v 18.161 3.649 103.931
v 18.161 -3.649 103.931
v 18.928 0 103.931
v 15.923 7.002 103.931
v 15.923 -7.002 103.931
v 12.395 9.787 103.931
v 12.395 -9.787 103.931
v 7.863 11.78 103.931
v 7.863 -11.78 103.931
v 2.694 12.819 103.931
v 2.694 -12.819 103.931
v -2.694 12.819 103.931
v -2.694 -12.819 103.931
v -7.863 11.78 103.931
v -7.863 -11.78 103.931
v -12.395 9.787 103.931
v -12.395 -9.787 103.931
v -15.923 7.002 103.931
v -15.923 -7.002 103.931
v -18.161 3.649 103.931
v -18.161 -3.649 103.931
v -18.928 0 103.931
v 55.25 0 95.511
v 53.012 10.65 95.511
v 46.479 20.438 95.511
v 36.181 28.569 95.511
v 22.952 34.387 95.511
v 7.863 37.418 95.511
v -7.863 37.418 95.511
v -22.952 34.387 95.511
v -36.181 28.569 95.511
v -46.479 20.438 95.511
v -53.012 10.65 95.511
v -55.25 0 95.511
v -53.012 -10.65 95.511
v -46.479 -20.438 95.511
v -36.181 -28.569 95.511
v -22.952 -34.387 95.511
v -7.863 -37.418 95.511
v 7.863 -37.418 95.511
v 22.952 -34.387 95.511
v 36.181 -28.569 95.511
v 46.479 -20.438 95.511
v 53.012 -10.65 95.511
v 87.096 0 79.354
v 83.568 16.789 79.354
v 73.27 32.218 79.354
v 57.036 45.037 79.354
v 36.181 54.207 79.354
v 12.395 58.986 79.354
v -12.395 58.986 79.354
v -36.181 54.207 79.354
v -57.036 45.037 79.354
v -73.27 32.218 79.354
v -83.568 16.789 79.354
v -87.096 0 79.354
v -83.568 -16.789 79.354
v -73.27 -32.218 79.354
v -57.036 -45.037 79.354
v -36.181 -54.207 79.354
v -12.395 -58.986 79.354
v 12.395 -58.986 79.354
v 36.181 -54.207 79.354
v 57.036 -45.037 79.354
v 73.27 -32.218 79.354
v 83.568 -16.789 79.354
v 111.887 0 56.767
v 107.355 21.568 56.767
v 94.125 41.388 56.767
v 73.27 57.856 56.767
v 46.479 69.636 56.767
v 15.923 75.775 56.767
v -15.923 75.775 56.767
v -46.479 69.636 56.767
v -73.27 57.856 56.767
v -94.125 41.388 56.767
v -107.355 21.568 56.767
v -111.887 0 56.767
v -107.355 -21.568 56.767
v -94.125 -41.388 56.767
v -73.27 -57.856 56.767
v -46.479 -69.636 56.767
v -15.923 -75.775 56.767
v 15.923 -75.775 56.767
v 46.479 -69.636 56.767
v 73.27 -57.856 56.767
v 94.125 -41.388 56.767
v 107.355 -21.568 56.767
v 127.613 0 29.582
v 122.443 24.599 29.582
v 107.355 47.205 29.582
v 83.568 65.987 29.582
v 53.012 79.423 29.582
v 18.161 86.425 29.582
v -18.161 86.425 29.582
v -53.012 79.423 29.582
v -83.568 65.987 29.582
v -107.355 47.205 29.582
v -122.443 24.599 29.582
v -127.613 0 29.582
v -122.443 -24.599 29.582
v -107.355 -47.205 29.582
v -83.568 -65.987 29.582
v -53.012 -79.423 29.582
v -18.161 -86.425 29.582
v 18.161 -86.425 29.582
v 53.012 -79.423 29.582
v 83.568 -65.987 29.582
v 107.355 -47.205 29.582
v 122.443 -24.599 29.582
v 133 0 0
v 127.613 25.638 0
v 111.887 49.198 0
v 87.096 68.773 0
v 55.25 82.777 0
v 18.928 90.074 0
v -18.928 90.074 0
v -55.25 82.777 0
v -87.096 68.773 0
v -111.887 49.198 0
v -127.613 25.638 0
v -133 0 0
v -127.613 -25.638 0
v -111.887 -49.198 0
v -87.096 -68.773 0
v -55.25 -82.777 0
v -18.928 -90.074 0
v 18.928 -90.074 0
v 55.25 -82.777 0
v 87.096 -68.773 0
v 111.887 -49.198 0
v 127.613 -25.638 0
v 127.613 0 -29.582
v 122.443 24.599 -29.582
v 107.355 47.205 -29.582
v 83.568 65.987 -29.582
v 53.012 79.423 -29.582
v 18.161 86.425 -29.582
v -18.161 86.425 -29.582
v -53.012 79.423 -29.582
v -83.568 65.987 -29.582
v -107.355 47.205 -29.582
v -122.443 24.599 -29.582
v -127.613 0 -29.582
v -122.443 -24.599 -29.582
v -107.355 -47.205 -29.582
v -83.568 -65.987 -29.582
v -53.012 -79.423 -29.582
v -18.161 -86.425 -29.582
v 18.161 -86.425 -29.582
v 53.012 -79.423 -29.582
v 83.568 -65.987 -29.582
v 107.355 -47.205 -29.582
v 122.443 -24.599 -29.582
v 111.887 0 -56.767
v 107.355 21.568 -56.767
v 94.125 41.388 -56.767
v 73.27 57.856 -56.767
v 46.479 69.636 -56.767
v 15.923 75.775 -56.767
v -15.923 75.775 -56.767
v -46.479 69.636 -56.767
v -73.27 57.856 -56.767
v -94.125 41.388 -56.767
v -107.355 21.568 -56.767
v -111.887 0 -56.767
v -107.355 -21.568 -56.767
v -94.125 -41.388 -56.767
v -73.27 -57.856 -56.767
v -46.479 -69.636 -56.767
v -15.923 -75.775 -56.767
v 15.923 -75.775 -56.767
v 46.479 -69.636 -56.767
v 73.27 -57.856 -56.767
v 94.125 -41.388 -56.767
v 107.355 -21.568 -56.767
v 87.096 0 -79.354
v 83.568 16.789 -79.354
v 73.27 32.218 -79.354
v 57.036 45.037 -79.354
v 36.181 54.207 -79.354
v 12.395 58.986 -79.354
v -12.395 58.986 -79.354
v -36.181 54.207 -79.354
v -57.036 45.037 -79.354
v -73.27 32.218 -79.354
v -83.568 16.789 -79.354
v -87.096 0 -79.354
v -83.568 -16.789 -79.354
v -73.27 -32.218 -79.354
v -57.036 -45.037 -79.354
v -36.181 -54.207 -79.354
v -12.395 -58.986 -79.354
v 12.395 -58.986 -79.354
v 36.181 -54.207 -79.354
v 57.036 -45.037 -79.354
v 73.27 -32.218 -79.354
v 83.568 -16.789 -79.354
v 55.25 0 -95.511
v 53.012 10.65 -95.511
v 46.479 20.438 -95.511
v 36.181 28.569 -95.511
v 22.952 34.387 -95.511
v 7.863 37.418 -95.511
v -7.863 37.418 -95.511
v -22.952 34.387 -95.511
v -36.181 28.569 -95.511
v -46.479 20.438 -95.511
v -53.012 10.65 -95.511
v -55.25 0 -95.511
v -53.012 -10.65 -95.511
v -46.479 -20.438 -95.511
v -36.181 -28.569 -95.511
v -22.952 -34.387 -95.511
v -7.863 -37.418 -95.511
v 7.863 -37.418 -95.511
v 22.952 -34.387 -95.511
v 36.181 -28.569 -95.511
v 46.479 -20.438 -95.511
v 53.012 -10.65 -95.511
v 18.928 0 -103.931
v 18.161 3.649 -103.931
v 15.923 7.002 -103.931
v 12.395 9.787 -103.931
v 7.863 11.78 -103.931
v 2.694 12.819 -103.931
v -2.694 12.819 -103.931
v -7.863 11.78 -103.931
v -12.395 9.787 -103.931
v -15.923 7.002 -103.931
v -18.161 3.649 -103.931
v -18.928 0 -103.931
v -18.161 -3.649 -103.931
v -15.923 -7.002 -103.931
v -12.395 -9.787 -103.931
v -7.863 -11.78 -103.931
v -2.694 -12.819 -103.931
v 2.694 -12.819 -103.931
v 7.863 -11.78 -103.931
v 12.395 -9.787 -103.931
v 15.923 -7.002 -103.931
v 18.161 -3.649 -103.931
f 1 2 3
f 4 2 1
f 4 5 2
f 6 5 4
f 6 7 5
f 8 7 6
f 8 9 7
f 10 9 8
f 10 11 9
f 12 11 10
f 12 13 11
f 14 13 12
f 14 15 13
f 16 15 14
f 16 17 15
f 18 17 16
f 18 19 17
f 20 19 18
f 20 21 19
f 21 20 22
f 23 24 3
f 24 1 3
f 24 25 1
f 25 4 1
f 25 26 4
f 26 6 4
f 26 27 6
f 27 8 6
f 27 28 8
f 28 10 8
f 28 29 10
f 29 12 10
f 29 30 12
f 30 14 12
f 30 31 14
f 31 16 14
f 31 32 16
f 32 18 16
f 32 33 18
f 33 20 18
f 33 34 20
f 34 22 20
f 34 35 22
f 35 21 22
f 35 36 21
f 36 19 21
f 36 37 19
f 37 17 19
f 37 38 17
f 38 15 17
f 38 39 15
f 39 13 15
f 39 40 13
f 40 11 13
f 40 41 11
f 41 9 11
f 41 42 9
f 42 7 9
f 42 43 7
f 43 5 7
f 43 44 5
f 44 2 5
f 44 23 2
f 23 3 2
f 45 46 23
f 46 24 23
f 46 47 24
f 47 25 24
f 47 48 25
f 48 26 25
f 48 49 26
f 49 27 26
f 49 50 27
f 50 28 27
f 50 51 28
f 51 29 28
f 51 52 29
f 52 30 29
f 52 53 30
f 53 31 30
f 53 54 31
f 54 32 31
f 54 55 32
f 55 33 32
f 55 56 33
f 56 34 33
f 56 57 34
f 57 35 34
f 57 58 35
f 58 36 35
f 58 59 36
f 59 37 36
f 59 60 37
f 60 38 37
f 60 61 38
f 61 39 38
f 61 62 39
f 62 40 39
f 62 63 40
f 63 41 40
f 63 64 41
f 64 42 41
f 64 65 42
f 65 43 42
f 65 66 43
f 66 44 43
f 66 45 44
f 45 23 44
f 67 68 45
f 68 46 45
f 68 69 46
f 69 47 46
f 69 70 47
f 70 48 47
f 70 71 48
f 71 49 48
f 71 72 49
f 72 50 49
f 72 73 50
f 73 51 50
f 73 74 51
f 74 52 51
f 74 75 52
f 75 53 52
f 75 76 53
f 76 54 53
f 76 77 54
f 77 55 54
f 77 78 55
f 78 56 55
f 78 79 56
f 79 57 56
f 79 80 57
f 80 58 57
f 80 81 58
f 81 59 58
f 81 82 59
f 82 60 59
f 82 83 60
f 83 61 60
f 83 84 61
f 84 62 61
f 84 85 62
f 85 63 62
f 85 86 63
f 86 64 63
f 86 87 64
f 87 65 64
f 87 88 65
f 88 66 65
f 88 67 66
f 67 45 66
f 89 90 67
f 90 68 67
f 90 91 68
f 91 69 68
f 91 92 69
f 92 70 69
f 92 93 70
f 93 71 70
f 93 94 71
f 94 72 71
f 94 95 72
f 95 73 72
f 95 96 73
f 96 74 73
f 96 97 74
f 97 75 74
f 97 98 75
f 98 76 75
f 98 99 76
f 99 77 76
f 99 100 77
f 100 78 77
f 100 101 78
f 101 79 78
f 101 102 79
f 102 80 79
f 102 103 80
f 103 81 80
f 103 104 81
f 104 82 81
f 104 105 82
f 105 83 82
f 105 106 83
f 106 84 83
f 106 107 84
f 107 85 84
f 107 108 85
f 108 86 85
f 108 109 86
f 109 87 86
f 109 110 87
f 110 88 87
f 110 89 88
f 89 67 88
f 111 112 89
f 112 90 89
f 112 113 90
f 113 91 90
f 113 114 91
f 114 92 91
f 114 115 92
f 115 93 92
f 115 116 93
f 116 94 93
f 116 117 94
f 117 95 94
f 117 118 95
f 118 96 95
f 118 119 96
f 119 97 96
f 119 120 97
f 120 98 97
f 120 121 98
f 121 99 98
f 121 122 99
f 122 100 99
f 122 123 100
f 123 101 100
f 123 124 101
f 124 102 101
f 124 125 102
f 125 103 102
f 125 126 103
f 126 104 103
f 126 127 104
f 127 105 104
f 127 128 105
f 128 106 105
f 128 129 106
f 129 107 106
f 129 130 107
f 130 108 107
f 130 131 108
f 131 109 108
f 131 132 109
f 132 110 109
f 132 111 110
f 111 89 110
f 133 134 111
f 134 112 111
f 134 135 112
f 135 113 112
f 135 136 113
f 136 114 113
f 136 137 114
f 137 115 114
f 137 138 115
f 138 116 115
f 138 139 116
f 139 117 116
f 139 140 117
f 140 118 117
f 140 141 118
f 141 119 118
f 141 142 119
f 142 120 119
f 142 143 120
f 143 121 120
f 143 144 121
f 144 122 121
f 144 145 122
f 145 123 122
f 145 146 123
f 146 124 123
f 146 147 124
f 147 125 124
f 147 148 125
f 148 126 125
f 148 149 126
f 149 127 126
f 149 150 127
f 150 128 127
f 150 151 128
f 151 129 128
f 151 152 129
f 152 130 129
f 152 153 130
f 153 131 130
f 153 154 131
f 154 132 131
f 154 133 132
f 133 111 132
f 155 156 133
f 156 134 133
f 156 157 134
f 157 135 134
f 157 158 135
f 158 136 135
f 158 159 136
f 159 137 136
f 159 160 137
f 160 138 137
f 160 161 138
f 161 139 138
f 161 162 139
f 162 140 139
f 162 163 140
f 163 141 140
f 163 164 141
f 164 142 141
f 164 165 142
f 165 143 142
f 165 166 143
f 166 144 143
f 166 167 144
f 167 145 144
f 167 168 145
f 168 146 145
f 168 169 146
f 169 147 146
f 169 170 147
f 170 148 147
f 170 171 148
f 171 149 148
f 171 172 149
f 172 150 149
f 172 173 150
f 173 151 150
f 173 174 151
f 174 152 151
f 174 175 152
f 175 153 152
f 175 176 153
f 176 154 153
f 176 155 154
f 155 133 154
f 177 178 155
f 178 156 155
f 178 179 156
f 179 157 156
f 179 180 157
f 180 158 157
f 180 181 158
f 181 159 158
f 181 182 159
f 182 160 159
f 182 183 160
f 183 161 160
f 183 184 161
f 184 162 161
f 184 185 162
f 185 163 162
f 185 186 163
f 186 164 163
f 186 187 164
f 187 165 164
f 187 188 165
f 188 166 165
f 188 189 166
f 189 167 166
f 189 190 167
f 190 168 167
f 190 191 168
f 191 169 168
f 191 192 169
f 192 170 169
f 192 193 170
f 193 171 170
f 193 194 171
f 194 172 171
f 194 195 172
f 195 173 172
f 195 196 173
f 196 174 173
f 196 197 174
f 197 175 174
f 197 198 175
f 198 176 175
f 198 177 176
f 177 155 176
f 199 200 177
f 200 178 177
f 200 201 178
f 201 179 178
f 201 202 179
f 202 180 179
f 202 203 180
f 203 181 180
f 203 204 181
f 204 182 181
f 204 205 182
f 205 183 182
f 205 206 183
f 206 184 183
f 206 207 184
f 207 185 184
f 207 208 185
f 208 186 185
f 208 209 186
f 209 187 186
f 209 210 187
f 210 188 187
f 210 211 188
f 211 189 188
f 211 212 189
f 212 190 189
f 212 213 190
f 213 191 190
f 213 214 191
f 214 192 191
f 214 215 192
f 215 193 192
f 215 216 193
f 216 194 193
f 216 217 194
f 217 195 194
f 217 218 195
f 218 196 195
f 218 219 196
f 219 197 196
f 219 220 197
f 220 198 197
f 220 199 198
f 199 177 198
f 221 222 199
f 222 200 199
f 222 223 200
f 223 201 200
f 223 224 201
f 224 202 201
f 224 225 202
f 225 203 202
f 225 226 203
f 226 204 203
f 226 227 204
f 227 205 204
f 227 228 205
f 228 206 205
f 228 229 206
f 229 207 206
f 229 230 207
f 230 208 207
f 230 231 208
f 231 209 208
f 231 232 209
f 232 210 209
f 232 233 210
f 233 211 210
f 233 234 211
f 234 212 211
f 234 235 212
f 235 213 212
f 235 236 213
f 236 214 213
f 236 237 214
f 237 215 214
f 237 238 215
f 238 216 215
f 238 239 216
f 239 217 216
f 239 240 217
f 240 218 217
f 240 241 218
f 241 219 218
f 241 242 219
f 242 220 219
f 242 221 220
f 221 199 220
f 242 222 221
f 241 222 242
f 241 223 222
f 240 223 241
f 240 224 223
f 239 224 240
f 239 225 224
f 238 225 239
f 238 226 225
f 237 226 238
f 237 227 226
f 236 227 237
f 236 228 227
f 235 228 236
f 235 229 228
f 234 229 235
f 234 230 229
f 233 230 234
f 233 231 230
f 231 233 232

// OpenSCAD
// Generated by SolidPython 1.0.1 on 2020-07-29 00:46:54


scale(v = [19, 13, 15]) {
	sphere(r = 7);
}
/***********************************************
*********      SolidPython code:      **********
************************************************
 
# import packages: SolidPython
from solid import *
from solid.utils import *
from itertools import chain, combinations, permutations


class Resize:

    def __init__(self, scad_file):
        self.scad_file = scad_file
        #self.scad_file = import_scad(scad_file)
        # cone/cylinder param:
        self.r1 = 0
        self.r2 = 0
        self.h = 0
        # rectangular prism param:
        self.w = 0
        self.l = 0
        # ellipse param:
        self.r = 0

    # import OpenScad code (file name corresponds to shape)


    # classify shape + parameters
    def assign(self, param1, param2, param3):
        if self.scad_file == 'cone.scad':
            self.r1 = param1
            self.r2 = param2
            self.h = param3
        elif self.scad_file == 'cylinder.scad':
            self.r1 = param1
            self.r2 = param2
            self.h = param3
        elif self.scad_file == 'rectangularPrism.scad':
            self.h = param1
            self.l = param2
            self.w = param3
        else:
            self.r = param1
            self.h = param2

    # resize parameters
    def iterate(self):
        x = range(3, 20, 2)
        i = 1
        if self.scad_file == 'cone.scad':
            tempList = list(permutations(x, 2))
            for temp in tempList:
                param1 = temp[0]
                param2 = temp[1]
                filepath = 'produced_scad_files/' + 'cone' + str(param1) + '_' + str(param2) + '_' + '.scad'
                scad_render_to_file(cylinder(h=param1, r1=param2, r2=0), filepath)

        elif self.scad_file == 'cylinder.scad':
            tempList = list(permutations(x, 3))
            for temp in tempList:
                param1 = temp[0]
                param2 = temp[1]
                filepath = 'produced_scad_files/' + 'cylinder' + str(param1) + '_' + str(param2) + '_' + '.scad'
                scad_render_to_file(cylinder(h=param1, r1=param2, r2=param2), filepath)

        elif self.scad_file == 'rectangularPrism.scad':
            tempList = list(permutations(x, 3))
            for temp in tempList:
                param1 = temp[0]
                param2 = temp[1]
                param3 = temp[2]
                filepath = 'produced_scad_files/' + 'rectangularPrism' + str(param1) + '_' + str(param2) + '_' + str(
                    param3) + '.scad'
                scad_render_to_file(cube(size=(param1, param2, param3)), filepath)

        elif self.scad_file == 'ellipse.scad':
            tempList = list(permutations(x, 4))
            for temp in tempList:
                param1 = temp[0]
                param2 = temp[1]
                param3 = temp[2]
                param4 = temp[3]
                filepath = 'produced_scad_files/' + 'ellipse' + str(param1) + '_' + str(param2) + '_' + str(param3) + '_' + str(param4) + '.scad'
                scad_render_to_file(scale([param1, param2, param3])(sphere(r=param4)), filepath)

    def render_to_scadfile(self):
        scad_render_to_file(scad, 'example.scad') 
 
************************************************/
